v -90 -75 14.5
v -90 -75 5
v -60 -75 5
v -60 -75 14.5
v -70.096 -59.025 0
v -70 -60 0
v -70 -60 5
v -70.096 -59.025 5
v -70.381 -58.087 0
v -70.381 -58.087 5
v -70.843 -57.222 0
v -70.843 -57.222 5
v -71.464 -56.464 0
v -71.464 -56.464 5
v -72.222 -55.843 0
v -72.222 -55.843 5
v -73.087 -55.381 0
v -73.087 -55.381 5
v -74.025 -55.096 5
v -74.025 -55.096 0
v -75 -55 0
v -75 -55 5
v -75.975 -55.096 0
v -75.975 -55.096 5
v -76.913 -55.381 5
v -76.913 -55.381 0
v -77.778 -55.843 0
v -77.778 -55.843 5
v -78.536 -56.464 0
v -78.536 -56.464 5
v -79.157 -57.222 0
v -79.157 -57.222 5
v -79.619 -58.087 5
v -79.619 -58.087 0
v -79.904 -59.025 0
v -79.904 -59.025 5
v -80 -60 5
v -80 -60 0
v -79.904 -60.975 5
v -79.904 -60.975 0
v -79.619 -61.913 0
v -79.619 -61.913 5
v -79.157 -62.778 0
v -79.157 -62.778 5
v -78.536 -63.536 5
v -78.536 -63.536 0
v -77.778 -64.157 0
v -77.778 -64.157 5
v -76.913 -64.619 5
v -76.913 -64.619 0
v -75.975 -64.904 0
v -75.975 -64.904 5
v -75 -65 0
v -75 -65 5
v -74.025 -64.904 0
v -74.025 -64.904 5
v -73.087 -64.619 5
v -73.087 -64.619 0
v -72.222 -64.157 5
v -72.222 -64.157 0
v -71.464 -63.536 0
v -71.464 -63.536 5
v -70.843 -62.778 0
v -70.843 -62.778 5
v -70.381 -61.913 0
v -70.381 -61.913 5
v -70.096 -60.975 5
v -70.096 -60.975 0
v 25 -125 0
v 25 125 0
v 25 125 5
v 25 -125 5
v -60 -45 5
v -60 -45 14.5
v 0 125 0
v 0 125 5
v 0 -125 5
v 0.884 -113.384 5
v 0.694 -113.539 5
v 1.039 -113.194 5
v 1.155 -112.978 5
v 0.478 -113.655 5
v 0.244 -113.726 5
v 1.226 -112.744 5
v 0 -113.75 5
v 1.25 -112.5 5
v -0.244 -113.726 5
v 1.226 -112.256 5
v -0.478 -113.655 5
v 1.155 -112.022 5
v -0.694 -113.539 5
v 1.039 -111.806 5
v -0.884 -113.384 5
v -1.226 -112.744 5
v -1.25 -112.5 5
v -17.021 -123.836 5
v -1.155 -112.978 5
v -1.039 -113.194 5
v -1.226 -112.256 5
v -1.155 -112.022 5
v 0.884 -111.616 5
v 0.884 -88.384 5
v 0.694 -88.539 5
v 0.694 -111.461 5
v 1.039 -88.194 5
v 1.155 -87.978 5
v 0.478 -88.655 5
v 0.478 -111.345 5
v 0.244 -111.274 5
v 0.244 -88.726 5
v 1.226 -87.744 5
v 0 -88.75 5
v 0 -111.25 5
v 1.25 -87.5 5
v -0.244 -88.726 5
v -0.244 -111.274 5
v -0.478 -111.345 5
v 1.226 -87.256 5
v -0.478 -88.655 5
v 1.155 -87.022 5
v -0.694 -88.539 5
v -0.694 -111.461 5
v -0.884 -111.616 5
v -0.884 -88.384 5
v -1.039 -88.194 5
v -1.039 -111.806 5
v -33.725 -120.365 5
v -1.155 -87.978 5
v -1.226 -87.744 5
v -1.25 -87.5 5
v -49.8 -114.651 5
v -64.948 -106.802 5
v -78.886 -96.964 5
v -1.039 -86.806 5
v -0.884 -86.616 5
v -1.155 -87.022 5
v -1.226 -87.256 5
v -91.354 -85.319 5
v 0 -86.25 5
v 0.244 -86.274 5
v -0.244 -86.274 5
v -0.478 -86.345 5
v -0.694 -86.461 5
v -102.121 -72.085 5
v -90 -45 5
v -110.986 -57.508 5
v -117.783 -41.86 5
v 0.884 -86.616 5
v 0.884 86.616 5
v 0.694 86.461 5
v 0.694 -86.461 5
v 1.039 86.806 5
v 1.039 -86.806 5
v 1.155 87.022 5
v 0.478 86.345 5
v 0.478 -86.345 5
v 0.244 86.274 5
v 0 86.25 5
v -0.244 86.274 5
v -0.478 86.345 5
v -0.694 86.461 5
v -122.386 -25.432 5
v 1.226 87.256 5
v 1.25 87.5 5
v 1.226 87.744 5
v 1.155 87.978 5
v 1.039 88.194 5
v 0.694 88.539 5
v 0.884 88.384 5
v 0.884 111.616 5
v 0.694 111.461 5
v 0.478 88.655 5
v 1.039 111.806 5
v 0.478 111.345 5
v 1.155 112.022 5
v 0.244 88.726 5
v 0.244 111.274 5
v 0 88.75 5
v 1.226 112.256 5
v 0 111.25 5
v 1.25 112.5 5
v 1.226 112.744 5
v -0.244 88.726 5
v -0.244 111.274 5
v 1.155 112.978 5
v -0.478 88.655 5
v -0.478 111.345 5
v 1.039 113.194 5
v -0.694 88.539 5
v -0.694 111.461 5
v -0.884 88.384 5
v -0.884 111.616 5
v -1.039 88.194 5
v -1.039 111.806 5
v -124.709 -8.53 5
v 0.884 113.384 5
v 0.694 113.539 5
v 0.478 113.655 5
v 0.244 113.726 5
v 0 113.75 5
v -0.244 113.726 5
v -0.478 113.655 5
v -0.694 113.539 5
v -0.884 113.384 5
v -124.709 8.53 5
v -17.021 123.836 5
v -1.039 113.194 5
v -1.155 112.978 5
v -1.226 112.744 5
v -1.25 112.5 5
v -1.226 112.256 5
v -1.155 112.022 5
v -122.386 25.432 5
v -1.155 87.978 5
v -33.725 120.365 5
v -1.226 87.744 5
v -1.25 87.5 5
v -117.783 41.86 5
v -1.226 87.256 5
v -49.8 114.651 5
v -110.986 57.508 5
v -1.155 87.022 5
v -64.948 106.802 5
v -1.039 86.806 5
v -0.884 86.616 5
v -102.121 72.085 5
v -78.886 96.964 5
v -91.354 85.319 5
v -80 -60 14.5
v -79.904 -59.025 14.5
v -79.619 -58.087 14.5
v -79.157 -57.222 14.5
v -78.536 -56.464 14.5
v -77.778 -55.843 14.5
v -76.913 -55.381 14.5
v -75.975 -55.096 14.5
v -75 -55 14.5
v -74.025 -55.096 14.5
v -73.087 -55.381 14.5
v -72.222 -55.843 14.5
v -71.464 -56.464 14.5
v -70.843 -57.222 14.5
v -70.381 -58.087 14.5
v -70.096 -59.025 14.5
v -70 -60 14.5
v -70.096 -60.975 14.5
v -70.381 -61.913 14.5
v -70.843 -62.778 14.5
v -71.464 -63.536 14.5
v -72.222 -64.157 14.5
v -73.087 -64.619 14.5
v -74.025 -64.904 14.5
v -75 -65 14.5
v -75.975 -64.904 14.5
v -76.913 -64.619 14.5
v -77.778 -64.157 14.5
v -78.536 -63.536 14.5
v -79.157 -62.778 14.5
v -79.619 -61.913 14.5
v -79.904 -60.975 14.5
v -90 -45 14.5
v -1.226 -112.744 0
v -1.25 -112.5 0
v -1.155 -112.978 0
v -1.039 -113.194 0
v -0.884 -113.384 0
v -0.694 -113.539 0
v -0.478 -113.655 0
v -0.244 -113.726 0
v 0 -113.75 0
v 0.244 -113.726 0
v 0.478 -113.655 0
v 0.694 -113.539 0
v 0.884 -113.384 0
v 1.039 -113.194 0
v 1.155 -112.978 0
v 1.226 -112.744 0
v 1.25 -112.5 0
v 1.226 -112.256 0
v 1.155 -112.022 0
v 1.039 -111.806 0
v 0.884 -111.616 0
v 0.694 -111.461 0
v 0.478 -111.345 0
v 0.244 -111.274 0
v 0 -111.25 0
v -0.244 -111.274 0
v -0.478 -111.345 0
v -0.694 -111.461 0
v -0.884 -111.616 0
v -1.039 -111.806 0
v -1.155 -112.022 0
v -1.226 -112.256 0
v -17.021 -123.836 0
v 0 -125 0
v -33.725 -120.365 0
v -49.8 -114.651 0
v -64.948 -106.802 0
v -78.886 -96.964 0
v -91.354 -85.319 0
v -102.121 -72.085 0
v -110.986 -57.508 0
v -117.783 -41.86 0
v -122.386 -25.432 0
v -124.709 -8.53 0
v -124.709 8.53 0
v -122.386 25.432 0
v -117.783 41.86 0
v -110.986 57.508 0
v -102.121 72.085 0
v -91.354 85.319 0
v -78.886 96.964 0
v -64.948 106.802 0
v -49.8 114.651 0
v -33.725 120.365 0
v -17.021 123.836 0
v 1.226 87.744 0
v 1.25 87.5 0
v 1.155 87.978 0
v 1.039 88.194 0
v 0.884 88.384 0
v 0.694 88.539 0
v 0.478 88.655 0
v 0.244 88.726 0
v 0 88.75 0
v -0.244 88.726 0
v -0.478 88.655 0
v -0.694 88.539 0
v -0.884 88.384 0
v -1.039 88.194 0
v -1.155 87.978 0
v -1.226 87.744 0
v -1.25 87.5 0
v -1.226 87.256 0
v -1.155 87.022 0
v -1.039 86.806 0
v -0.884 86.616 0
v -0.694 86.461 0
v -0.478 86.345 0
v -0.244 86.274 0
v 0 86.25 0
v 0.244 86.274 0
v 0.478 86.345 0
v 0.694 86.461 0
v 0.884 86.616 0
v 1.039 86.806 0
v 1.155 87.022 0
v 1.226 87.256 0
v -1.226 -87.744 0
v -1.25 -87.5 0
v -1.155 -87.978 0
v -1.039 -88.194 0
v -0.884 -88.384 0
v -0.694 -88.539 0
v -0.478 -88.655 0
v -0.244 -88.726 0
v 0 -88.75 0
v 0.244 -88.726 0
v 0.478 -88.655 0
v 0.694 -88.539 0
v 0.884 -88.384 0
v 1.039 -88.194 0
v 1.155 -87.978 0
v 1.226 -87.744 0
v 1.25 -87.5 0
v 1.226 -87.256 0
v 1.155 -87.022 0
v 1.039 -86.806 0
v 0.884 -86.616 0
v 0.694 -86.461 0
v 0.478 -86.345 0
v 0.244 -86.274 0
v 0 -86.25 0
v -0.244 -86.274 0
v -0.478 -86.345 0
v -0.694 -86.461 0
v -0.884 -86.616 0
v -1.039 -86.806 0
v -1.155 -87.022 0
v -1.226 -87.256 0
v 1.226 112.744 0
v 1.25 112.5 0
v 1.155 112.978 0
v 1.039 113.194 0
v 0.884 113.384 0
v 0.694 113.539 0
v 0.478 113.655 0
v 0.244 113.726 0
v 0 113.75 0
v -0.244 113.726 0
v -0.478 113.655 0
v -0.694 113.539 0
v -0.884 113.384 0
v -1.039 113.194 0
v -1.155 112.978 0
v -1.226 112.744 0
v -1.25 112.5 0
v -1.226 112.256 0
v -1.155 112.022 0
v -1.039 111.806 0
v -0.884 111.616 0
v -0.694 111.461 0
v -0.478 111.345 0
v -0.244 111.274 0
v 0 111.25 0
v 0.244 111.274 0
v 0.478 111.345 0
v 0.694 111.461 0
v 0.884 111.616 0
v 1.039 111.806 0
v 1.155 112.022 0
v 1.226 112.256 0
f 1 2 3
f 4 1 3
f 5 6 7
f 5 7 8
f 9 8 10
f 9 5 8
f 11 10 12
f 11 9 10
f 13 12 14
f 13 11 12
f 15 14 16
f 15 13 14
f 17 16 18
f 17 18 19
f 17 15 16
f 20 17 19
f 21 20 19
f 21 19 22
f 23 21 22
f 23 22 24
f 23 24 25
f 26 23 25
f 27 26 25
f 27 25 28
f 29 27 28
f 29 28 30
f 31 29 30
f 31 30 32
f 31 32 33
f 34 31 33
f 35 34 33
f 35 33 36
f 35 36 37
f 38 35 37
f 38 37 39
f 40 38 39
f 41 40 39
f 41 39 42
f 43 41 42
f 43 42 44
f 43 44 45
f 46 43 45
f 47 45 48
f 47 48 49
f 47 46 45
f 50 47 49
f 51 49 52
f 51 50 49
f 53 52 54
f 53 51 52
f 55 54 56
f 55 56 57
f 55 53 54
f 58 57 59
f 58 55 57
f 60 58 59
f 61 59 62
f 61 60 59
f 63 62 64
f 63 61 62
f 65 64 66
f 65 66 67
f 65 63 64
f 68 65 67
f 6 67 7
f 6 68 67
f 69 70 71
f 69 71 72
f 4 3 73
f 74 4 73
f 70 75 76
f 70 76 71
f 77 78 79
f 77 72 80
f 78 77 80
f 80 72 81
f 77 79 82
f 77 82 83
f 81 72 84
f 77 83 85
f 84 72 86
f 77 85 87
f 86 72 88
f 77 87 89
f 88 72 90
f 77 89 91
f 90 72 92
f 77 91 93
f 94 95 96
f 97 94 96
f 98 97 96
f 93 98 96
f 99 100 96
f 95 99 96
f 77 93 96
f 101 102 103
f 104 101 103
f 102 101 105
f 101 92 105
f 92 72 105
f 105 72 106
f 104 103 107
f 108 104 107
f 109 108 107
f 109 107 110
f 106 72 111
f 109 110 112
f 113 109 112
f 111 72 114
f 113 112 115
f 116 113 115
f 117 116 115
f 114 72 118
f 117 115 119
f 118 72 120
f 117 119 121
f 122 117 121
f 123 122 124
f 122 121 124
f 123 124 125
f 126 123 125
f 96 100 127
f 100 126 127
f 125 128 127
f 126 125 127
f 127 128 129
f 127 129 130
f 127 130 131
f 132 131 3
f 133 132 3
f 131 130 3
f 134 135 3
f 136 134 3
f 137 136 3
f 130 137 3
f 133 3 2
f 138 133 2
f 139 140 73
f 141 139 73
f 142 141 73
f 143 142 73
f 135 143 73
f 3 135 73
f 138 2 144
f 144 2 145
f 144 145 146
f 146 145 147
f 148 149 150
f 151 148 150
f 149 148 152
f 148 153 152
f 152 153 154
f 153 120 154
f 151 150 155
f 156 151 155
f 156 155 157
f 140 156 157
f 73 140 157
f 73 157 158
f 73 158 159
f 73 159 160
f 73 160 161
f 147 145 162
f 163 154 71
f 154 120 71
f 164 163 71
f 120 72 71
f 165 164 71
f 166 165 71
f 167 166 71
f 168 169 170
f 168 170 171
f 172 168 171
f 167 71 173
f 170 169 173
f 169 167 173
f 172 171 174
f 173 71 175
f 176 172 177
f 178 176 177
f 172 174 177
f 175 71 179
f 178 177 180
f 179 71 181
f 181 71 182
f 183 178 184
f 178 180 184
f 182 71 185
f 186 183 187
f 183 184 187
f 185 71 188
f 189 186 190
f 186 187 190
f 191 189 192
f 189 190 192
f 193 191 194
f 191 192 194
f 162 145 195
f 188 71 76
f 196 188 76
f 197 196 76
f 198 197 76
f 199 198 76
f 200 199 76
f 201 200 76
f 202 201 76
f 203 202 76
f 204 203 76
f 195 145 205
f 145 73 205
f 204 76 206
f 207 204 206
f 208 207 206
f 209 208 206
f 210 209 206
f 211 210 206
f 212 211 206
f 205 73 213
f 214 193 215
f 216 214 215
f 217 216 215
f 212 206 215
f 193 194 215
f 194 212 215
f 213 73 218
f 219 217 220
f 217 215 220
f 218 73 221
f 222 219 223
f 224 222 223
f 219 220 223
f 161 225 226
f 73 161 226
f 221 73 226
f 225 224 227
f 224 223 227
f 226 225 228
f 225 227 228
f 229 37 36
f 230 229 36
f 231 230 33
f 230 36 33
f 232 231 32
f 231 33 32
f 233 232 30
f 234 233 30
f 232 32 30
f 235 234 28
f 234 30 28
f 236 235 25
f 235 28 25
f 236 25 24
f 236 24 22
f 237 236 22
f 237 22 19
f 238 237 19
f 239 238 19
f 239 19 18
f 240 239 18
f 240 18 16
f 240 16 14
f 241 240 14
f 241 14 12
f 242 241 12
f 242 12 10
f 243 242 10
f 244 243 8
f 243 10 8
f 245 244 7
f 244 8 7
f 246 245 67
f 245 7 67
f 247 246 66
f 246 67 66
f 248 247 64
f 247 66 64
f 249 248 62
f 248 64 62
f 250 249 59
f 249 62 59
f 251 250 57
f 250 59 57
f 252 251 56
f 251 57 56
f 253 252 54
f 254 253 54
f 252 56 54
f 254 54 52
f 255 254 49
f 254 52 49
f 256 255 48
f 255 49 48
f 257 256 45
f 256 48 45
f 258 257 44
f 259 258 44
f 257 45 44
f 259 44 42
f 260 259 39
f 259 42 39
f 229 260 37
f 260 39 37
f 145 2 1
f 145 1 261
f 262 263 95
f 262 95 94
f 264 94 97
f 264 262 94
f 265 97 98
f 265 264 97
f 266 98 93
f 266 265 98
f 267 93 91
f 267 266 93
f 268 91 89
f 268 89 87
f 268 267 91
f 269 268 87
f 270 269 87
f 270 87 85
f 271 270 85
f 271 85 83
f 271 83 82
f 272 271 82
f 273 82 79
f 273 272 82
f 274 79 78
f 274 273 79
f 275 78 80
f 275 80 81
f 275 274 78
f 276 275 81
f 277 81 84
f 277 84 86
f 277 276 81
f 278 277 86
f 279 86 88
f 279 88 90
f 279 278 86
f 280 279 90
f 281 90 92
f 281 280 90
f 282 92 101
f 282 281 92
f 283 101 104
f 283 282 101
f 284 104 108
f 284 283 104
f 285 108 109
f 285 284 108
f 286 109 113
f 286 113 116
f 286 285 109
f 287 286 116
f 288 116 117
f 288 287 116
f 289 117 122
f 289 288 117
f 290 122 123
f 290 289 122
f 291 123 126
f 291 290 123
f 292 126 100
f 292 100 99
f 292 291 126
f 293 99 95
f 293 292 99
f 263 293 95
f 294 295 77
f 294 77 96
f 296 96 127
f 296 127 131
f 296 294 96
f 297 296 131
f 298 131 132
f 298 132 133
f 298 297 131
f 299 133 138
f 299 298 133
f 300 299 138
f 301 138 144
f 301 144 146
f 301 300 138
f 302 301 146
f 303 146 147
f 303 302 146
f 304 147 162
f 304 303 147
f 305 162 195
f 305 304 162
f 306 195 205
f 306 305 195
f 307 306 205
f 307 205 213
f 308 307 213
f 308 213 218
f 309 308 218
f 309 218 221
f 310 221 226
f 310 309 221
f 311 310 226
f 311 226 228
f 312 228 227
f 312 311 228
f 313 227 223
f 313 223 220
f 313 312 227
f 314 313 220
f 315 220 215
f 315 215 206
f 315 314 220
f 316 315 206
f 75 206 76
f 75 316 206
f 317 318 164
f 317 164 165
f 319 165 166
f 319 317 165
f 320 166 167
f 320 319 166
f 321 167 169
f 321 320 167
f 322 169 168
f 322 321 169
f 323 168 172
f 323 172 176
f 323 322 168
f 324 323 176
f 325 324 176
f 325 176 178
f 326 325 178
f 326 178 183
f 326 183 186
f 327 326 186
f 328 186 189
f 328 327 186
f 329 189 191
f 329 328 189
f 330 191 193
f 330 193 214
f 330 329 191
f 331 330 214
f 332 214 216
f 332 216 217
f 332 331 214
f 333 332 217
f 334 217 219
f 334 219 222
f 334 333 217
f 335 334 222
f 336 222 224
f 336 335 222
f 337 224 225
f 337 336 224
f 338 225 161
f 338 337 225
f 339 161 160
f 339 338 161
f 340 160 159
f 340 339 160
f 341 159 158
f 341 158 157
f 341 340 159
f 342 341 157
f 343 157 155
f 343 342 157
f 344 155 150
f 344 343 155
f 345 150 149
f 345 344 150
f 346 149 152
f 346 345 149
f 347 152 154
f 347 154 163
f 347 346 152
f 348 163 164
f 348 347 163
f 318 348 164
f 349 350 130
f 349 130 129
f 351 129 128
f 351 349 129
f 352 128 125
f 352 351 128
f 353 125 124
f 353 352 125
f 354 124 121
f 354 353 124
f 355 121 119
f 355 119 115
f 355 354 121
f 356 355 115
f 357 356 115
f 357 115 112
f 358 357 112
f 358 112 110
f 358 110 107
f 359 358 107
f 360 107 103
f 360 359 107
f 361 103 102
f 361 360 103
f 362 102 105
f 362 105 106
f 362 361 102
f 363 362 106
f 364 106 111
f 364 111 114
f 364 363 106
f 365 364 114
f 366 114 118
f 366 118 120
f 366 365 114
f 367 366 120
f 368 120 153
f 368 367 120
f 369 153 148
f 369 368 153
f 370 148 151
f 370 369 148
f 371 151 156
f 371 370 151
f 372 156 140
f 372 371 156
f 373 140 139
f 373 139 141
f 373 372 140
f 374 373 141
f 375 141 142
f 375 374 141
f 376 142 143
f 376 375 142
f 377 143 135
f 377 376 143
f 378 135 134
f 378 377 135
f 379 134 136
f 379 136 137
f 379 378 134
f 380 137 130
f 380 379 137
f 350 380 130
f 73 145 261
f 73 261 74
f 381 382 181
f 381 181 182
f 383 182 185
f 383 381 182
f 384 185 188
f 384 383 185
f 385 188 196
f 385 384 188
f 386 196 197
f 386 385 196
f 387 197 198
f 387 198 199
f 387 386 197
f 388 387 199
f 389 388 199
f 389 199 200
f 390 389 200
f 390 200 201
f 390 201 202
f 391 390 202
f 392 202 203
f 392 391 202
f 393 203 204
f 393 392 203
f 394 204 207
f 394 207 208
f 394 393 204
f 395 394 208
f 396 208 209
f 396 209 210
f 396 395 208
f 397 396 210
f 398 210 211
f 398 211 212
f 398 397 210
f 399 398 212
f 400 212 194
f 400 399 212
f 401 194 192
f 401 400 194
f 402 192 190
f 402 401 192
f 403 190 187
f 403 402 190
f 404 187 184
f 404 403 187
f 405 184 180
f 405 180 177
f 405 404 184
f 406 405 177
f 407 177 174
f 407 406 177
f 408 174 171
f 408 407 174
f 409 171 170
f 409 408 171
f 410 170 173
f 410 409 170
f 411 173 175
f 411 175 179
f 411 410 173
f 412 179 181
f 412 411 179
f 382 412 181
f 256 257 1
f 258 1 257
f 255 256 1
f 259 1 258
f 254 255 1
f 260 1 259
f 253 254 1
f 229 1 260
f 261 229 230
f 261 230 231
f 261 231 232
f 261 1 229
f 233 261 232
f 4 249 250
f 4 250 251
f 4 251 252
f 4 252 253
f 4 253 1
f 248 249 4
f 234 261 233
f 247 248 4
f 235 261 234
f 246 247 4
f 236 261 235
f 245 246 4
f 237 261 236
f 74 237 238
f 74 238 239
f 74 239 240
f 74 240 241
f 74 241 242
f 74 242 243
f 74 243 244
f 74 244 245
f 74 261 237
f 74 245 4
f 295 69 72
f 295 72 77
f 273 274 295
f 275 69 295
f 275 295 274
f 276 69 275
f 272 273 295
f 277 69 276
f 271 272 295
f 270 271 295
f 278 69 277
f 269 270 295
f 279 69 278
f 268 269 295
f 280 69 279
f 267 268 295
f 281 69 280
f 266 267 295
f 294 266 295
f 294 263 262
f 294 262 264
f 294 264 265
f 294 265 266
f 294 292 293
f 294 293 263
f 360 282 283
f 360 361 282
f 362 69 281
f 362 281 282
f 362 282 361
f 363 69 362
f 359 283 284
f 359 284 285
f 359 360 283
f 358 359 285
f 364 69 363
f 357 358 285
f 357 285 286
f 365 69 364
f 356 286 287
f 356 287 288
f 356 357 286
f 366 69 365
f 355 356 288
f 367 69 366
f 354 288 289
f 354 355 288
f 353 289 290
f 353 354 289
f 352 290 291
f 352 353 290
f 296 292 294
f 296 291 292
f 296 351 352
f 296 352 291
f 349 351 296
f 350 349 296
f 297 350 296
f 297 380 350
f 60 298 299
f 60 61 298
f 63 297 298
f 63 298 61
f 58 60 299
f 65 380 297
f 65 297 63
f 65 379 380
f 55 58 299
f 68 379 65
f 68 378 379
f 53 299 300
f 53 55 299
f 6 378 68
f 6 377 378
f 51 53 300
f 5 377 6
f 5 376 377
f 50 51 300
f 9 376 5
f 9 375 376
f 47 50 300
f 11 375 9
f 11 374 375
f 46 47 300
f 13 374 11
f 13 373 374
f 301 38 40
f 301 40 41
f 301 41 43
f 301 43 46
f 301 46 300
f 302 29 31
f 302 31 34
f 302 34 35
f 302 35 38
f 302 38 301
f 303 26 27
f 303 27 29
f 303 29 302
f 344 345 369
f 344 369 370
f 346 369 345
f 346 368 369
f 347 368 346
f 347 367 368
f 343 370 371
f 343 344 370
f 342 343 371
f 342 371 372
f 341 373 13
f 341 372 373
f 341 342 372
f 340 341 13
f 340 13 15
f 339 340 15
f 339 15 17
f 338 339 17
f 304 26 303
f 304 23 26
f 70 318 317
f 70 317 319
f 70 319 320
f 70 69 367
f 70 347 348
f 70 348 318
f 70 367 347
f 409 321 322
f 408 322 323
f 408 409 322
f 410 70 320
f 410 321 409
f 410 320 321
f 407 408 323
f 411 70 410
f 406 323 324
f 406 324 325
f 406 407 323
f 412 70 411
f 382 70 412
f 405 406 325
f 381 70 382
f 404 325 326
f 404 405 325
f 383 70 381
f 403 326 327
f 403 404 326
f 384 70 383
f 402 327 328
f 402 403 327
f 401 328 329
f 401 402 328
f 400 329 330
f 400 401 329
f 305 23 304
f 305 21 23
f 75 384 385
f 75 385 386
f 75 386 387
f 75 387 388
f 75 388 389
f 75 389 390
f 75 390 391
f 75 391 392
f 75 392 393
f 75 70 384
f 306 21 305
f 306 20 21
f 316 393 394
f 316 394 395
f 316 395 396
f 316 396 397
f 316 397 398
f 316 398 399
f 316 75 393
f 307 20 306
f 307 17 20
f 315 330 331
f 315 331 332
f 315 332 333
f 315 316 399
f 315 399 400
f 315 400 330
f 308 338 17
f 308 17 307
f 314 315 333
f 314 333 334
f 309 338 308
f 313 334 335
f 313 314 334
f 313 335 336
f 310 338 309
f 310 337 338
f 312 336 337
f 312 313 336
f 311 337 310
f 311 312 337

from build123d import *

# Parameters (mm, degrees)
SKETCH_1_R          = 1.25
SKETCH_1_R_2        = 5
EXTRUDE_1_DEPTH     = 5
SKETCH_2_W          = 30
SKETCH_2_H          = 30
EXTRUDE_2_DEPTH     = 9.5
SKETCH_3_R          = 5
CUT_EXTRUDE_1_DEPTH = 9.5


with BuildPart() as part:
    # 草图1 → 凸台-拉伸1 (new body)
    with BuildSketch(Plane.XY):
        with BuildLine():
            Line((0, 125), (25, 125))
            Line((25, 125), (25, -125))
            Line((25, -125), (0, -125))
            ThreePointArc((0, -125), (-125, 0), (0, 125))
        make_face()
        with Locations((0, 112.5)):
            Circle(SKETCH_1_R, mode=Mode.SUBTRACT)
        with Locations((0, 87.5)):
            Circle(SKETCH_1_R, mode=Mode.SUBTRACT)
        with Locations(Location((0, -87.5, 0), (0, 0, 180))):
            Circle(SKETCH_1_R, mode=Mode.SUBTRACT)
        with Locations(Location((0, -112.5, 0), (0, 0, 180))):
            Circle(SKETCH_1_R, mode=Mode.SUBTRACT)
        with Locations((-75, -60)):
            Circle(SKETCH_1_R_2, mode=Mode.SUBTRACT)
    extrude(amount=EXTRUDE_1_DEPTH)

    # 草图2 → 凸台-拉伸2 (add)
    with BuildSketch(Plane.XY.offset(5)):
        with Locations((-75, -60)):
            Rectangle(SKETCH_2_W, SKETCH_2_H)
    extrude(amount=EXTRUDE_2_DEPTH)

    # 草图3 → 切除-拉伸1 (cut)
    with BuildSketch(Plane(origin=(0, 0, 5), x_dir=(-1, 0, 0), z_dir=(0, 0, -1))):
        with Locations((75, -60)):
            Circle(SKETCH_3_R)
    extrude(amount=-CUT_EXTRUDE_1_DEPTH, mode=Mode.SUBTRACT)


solid = part.part
